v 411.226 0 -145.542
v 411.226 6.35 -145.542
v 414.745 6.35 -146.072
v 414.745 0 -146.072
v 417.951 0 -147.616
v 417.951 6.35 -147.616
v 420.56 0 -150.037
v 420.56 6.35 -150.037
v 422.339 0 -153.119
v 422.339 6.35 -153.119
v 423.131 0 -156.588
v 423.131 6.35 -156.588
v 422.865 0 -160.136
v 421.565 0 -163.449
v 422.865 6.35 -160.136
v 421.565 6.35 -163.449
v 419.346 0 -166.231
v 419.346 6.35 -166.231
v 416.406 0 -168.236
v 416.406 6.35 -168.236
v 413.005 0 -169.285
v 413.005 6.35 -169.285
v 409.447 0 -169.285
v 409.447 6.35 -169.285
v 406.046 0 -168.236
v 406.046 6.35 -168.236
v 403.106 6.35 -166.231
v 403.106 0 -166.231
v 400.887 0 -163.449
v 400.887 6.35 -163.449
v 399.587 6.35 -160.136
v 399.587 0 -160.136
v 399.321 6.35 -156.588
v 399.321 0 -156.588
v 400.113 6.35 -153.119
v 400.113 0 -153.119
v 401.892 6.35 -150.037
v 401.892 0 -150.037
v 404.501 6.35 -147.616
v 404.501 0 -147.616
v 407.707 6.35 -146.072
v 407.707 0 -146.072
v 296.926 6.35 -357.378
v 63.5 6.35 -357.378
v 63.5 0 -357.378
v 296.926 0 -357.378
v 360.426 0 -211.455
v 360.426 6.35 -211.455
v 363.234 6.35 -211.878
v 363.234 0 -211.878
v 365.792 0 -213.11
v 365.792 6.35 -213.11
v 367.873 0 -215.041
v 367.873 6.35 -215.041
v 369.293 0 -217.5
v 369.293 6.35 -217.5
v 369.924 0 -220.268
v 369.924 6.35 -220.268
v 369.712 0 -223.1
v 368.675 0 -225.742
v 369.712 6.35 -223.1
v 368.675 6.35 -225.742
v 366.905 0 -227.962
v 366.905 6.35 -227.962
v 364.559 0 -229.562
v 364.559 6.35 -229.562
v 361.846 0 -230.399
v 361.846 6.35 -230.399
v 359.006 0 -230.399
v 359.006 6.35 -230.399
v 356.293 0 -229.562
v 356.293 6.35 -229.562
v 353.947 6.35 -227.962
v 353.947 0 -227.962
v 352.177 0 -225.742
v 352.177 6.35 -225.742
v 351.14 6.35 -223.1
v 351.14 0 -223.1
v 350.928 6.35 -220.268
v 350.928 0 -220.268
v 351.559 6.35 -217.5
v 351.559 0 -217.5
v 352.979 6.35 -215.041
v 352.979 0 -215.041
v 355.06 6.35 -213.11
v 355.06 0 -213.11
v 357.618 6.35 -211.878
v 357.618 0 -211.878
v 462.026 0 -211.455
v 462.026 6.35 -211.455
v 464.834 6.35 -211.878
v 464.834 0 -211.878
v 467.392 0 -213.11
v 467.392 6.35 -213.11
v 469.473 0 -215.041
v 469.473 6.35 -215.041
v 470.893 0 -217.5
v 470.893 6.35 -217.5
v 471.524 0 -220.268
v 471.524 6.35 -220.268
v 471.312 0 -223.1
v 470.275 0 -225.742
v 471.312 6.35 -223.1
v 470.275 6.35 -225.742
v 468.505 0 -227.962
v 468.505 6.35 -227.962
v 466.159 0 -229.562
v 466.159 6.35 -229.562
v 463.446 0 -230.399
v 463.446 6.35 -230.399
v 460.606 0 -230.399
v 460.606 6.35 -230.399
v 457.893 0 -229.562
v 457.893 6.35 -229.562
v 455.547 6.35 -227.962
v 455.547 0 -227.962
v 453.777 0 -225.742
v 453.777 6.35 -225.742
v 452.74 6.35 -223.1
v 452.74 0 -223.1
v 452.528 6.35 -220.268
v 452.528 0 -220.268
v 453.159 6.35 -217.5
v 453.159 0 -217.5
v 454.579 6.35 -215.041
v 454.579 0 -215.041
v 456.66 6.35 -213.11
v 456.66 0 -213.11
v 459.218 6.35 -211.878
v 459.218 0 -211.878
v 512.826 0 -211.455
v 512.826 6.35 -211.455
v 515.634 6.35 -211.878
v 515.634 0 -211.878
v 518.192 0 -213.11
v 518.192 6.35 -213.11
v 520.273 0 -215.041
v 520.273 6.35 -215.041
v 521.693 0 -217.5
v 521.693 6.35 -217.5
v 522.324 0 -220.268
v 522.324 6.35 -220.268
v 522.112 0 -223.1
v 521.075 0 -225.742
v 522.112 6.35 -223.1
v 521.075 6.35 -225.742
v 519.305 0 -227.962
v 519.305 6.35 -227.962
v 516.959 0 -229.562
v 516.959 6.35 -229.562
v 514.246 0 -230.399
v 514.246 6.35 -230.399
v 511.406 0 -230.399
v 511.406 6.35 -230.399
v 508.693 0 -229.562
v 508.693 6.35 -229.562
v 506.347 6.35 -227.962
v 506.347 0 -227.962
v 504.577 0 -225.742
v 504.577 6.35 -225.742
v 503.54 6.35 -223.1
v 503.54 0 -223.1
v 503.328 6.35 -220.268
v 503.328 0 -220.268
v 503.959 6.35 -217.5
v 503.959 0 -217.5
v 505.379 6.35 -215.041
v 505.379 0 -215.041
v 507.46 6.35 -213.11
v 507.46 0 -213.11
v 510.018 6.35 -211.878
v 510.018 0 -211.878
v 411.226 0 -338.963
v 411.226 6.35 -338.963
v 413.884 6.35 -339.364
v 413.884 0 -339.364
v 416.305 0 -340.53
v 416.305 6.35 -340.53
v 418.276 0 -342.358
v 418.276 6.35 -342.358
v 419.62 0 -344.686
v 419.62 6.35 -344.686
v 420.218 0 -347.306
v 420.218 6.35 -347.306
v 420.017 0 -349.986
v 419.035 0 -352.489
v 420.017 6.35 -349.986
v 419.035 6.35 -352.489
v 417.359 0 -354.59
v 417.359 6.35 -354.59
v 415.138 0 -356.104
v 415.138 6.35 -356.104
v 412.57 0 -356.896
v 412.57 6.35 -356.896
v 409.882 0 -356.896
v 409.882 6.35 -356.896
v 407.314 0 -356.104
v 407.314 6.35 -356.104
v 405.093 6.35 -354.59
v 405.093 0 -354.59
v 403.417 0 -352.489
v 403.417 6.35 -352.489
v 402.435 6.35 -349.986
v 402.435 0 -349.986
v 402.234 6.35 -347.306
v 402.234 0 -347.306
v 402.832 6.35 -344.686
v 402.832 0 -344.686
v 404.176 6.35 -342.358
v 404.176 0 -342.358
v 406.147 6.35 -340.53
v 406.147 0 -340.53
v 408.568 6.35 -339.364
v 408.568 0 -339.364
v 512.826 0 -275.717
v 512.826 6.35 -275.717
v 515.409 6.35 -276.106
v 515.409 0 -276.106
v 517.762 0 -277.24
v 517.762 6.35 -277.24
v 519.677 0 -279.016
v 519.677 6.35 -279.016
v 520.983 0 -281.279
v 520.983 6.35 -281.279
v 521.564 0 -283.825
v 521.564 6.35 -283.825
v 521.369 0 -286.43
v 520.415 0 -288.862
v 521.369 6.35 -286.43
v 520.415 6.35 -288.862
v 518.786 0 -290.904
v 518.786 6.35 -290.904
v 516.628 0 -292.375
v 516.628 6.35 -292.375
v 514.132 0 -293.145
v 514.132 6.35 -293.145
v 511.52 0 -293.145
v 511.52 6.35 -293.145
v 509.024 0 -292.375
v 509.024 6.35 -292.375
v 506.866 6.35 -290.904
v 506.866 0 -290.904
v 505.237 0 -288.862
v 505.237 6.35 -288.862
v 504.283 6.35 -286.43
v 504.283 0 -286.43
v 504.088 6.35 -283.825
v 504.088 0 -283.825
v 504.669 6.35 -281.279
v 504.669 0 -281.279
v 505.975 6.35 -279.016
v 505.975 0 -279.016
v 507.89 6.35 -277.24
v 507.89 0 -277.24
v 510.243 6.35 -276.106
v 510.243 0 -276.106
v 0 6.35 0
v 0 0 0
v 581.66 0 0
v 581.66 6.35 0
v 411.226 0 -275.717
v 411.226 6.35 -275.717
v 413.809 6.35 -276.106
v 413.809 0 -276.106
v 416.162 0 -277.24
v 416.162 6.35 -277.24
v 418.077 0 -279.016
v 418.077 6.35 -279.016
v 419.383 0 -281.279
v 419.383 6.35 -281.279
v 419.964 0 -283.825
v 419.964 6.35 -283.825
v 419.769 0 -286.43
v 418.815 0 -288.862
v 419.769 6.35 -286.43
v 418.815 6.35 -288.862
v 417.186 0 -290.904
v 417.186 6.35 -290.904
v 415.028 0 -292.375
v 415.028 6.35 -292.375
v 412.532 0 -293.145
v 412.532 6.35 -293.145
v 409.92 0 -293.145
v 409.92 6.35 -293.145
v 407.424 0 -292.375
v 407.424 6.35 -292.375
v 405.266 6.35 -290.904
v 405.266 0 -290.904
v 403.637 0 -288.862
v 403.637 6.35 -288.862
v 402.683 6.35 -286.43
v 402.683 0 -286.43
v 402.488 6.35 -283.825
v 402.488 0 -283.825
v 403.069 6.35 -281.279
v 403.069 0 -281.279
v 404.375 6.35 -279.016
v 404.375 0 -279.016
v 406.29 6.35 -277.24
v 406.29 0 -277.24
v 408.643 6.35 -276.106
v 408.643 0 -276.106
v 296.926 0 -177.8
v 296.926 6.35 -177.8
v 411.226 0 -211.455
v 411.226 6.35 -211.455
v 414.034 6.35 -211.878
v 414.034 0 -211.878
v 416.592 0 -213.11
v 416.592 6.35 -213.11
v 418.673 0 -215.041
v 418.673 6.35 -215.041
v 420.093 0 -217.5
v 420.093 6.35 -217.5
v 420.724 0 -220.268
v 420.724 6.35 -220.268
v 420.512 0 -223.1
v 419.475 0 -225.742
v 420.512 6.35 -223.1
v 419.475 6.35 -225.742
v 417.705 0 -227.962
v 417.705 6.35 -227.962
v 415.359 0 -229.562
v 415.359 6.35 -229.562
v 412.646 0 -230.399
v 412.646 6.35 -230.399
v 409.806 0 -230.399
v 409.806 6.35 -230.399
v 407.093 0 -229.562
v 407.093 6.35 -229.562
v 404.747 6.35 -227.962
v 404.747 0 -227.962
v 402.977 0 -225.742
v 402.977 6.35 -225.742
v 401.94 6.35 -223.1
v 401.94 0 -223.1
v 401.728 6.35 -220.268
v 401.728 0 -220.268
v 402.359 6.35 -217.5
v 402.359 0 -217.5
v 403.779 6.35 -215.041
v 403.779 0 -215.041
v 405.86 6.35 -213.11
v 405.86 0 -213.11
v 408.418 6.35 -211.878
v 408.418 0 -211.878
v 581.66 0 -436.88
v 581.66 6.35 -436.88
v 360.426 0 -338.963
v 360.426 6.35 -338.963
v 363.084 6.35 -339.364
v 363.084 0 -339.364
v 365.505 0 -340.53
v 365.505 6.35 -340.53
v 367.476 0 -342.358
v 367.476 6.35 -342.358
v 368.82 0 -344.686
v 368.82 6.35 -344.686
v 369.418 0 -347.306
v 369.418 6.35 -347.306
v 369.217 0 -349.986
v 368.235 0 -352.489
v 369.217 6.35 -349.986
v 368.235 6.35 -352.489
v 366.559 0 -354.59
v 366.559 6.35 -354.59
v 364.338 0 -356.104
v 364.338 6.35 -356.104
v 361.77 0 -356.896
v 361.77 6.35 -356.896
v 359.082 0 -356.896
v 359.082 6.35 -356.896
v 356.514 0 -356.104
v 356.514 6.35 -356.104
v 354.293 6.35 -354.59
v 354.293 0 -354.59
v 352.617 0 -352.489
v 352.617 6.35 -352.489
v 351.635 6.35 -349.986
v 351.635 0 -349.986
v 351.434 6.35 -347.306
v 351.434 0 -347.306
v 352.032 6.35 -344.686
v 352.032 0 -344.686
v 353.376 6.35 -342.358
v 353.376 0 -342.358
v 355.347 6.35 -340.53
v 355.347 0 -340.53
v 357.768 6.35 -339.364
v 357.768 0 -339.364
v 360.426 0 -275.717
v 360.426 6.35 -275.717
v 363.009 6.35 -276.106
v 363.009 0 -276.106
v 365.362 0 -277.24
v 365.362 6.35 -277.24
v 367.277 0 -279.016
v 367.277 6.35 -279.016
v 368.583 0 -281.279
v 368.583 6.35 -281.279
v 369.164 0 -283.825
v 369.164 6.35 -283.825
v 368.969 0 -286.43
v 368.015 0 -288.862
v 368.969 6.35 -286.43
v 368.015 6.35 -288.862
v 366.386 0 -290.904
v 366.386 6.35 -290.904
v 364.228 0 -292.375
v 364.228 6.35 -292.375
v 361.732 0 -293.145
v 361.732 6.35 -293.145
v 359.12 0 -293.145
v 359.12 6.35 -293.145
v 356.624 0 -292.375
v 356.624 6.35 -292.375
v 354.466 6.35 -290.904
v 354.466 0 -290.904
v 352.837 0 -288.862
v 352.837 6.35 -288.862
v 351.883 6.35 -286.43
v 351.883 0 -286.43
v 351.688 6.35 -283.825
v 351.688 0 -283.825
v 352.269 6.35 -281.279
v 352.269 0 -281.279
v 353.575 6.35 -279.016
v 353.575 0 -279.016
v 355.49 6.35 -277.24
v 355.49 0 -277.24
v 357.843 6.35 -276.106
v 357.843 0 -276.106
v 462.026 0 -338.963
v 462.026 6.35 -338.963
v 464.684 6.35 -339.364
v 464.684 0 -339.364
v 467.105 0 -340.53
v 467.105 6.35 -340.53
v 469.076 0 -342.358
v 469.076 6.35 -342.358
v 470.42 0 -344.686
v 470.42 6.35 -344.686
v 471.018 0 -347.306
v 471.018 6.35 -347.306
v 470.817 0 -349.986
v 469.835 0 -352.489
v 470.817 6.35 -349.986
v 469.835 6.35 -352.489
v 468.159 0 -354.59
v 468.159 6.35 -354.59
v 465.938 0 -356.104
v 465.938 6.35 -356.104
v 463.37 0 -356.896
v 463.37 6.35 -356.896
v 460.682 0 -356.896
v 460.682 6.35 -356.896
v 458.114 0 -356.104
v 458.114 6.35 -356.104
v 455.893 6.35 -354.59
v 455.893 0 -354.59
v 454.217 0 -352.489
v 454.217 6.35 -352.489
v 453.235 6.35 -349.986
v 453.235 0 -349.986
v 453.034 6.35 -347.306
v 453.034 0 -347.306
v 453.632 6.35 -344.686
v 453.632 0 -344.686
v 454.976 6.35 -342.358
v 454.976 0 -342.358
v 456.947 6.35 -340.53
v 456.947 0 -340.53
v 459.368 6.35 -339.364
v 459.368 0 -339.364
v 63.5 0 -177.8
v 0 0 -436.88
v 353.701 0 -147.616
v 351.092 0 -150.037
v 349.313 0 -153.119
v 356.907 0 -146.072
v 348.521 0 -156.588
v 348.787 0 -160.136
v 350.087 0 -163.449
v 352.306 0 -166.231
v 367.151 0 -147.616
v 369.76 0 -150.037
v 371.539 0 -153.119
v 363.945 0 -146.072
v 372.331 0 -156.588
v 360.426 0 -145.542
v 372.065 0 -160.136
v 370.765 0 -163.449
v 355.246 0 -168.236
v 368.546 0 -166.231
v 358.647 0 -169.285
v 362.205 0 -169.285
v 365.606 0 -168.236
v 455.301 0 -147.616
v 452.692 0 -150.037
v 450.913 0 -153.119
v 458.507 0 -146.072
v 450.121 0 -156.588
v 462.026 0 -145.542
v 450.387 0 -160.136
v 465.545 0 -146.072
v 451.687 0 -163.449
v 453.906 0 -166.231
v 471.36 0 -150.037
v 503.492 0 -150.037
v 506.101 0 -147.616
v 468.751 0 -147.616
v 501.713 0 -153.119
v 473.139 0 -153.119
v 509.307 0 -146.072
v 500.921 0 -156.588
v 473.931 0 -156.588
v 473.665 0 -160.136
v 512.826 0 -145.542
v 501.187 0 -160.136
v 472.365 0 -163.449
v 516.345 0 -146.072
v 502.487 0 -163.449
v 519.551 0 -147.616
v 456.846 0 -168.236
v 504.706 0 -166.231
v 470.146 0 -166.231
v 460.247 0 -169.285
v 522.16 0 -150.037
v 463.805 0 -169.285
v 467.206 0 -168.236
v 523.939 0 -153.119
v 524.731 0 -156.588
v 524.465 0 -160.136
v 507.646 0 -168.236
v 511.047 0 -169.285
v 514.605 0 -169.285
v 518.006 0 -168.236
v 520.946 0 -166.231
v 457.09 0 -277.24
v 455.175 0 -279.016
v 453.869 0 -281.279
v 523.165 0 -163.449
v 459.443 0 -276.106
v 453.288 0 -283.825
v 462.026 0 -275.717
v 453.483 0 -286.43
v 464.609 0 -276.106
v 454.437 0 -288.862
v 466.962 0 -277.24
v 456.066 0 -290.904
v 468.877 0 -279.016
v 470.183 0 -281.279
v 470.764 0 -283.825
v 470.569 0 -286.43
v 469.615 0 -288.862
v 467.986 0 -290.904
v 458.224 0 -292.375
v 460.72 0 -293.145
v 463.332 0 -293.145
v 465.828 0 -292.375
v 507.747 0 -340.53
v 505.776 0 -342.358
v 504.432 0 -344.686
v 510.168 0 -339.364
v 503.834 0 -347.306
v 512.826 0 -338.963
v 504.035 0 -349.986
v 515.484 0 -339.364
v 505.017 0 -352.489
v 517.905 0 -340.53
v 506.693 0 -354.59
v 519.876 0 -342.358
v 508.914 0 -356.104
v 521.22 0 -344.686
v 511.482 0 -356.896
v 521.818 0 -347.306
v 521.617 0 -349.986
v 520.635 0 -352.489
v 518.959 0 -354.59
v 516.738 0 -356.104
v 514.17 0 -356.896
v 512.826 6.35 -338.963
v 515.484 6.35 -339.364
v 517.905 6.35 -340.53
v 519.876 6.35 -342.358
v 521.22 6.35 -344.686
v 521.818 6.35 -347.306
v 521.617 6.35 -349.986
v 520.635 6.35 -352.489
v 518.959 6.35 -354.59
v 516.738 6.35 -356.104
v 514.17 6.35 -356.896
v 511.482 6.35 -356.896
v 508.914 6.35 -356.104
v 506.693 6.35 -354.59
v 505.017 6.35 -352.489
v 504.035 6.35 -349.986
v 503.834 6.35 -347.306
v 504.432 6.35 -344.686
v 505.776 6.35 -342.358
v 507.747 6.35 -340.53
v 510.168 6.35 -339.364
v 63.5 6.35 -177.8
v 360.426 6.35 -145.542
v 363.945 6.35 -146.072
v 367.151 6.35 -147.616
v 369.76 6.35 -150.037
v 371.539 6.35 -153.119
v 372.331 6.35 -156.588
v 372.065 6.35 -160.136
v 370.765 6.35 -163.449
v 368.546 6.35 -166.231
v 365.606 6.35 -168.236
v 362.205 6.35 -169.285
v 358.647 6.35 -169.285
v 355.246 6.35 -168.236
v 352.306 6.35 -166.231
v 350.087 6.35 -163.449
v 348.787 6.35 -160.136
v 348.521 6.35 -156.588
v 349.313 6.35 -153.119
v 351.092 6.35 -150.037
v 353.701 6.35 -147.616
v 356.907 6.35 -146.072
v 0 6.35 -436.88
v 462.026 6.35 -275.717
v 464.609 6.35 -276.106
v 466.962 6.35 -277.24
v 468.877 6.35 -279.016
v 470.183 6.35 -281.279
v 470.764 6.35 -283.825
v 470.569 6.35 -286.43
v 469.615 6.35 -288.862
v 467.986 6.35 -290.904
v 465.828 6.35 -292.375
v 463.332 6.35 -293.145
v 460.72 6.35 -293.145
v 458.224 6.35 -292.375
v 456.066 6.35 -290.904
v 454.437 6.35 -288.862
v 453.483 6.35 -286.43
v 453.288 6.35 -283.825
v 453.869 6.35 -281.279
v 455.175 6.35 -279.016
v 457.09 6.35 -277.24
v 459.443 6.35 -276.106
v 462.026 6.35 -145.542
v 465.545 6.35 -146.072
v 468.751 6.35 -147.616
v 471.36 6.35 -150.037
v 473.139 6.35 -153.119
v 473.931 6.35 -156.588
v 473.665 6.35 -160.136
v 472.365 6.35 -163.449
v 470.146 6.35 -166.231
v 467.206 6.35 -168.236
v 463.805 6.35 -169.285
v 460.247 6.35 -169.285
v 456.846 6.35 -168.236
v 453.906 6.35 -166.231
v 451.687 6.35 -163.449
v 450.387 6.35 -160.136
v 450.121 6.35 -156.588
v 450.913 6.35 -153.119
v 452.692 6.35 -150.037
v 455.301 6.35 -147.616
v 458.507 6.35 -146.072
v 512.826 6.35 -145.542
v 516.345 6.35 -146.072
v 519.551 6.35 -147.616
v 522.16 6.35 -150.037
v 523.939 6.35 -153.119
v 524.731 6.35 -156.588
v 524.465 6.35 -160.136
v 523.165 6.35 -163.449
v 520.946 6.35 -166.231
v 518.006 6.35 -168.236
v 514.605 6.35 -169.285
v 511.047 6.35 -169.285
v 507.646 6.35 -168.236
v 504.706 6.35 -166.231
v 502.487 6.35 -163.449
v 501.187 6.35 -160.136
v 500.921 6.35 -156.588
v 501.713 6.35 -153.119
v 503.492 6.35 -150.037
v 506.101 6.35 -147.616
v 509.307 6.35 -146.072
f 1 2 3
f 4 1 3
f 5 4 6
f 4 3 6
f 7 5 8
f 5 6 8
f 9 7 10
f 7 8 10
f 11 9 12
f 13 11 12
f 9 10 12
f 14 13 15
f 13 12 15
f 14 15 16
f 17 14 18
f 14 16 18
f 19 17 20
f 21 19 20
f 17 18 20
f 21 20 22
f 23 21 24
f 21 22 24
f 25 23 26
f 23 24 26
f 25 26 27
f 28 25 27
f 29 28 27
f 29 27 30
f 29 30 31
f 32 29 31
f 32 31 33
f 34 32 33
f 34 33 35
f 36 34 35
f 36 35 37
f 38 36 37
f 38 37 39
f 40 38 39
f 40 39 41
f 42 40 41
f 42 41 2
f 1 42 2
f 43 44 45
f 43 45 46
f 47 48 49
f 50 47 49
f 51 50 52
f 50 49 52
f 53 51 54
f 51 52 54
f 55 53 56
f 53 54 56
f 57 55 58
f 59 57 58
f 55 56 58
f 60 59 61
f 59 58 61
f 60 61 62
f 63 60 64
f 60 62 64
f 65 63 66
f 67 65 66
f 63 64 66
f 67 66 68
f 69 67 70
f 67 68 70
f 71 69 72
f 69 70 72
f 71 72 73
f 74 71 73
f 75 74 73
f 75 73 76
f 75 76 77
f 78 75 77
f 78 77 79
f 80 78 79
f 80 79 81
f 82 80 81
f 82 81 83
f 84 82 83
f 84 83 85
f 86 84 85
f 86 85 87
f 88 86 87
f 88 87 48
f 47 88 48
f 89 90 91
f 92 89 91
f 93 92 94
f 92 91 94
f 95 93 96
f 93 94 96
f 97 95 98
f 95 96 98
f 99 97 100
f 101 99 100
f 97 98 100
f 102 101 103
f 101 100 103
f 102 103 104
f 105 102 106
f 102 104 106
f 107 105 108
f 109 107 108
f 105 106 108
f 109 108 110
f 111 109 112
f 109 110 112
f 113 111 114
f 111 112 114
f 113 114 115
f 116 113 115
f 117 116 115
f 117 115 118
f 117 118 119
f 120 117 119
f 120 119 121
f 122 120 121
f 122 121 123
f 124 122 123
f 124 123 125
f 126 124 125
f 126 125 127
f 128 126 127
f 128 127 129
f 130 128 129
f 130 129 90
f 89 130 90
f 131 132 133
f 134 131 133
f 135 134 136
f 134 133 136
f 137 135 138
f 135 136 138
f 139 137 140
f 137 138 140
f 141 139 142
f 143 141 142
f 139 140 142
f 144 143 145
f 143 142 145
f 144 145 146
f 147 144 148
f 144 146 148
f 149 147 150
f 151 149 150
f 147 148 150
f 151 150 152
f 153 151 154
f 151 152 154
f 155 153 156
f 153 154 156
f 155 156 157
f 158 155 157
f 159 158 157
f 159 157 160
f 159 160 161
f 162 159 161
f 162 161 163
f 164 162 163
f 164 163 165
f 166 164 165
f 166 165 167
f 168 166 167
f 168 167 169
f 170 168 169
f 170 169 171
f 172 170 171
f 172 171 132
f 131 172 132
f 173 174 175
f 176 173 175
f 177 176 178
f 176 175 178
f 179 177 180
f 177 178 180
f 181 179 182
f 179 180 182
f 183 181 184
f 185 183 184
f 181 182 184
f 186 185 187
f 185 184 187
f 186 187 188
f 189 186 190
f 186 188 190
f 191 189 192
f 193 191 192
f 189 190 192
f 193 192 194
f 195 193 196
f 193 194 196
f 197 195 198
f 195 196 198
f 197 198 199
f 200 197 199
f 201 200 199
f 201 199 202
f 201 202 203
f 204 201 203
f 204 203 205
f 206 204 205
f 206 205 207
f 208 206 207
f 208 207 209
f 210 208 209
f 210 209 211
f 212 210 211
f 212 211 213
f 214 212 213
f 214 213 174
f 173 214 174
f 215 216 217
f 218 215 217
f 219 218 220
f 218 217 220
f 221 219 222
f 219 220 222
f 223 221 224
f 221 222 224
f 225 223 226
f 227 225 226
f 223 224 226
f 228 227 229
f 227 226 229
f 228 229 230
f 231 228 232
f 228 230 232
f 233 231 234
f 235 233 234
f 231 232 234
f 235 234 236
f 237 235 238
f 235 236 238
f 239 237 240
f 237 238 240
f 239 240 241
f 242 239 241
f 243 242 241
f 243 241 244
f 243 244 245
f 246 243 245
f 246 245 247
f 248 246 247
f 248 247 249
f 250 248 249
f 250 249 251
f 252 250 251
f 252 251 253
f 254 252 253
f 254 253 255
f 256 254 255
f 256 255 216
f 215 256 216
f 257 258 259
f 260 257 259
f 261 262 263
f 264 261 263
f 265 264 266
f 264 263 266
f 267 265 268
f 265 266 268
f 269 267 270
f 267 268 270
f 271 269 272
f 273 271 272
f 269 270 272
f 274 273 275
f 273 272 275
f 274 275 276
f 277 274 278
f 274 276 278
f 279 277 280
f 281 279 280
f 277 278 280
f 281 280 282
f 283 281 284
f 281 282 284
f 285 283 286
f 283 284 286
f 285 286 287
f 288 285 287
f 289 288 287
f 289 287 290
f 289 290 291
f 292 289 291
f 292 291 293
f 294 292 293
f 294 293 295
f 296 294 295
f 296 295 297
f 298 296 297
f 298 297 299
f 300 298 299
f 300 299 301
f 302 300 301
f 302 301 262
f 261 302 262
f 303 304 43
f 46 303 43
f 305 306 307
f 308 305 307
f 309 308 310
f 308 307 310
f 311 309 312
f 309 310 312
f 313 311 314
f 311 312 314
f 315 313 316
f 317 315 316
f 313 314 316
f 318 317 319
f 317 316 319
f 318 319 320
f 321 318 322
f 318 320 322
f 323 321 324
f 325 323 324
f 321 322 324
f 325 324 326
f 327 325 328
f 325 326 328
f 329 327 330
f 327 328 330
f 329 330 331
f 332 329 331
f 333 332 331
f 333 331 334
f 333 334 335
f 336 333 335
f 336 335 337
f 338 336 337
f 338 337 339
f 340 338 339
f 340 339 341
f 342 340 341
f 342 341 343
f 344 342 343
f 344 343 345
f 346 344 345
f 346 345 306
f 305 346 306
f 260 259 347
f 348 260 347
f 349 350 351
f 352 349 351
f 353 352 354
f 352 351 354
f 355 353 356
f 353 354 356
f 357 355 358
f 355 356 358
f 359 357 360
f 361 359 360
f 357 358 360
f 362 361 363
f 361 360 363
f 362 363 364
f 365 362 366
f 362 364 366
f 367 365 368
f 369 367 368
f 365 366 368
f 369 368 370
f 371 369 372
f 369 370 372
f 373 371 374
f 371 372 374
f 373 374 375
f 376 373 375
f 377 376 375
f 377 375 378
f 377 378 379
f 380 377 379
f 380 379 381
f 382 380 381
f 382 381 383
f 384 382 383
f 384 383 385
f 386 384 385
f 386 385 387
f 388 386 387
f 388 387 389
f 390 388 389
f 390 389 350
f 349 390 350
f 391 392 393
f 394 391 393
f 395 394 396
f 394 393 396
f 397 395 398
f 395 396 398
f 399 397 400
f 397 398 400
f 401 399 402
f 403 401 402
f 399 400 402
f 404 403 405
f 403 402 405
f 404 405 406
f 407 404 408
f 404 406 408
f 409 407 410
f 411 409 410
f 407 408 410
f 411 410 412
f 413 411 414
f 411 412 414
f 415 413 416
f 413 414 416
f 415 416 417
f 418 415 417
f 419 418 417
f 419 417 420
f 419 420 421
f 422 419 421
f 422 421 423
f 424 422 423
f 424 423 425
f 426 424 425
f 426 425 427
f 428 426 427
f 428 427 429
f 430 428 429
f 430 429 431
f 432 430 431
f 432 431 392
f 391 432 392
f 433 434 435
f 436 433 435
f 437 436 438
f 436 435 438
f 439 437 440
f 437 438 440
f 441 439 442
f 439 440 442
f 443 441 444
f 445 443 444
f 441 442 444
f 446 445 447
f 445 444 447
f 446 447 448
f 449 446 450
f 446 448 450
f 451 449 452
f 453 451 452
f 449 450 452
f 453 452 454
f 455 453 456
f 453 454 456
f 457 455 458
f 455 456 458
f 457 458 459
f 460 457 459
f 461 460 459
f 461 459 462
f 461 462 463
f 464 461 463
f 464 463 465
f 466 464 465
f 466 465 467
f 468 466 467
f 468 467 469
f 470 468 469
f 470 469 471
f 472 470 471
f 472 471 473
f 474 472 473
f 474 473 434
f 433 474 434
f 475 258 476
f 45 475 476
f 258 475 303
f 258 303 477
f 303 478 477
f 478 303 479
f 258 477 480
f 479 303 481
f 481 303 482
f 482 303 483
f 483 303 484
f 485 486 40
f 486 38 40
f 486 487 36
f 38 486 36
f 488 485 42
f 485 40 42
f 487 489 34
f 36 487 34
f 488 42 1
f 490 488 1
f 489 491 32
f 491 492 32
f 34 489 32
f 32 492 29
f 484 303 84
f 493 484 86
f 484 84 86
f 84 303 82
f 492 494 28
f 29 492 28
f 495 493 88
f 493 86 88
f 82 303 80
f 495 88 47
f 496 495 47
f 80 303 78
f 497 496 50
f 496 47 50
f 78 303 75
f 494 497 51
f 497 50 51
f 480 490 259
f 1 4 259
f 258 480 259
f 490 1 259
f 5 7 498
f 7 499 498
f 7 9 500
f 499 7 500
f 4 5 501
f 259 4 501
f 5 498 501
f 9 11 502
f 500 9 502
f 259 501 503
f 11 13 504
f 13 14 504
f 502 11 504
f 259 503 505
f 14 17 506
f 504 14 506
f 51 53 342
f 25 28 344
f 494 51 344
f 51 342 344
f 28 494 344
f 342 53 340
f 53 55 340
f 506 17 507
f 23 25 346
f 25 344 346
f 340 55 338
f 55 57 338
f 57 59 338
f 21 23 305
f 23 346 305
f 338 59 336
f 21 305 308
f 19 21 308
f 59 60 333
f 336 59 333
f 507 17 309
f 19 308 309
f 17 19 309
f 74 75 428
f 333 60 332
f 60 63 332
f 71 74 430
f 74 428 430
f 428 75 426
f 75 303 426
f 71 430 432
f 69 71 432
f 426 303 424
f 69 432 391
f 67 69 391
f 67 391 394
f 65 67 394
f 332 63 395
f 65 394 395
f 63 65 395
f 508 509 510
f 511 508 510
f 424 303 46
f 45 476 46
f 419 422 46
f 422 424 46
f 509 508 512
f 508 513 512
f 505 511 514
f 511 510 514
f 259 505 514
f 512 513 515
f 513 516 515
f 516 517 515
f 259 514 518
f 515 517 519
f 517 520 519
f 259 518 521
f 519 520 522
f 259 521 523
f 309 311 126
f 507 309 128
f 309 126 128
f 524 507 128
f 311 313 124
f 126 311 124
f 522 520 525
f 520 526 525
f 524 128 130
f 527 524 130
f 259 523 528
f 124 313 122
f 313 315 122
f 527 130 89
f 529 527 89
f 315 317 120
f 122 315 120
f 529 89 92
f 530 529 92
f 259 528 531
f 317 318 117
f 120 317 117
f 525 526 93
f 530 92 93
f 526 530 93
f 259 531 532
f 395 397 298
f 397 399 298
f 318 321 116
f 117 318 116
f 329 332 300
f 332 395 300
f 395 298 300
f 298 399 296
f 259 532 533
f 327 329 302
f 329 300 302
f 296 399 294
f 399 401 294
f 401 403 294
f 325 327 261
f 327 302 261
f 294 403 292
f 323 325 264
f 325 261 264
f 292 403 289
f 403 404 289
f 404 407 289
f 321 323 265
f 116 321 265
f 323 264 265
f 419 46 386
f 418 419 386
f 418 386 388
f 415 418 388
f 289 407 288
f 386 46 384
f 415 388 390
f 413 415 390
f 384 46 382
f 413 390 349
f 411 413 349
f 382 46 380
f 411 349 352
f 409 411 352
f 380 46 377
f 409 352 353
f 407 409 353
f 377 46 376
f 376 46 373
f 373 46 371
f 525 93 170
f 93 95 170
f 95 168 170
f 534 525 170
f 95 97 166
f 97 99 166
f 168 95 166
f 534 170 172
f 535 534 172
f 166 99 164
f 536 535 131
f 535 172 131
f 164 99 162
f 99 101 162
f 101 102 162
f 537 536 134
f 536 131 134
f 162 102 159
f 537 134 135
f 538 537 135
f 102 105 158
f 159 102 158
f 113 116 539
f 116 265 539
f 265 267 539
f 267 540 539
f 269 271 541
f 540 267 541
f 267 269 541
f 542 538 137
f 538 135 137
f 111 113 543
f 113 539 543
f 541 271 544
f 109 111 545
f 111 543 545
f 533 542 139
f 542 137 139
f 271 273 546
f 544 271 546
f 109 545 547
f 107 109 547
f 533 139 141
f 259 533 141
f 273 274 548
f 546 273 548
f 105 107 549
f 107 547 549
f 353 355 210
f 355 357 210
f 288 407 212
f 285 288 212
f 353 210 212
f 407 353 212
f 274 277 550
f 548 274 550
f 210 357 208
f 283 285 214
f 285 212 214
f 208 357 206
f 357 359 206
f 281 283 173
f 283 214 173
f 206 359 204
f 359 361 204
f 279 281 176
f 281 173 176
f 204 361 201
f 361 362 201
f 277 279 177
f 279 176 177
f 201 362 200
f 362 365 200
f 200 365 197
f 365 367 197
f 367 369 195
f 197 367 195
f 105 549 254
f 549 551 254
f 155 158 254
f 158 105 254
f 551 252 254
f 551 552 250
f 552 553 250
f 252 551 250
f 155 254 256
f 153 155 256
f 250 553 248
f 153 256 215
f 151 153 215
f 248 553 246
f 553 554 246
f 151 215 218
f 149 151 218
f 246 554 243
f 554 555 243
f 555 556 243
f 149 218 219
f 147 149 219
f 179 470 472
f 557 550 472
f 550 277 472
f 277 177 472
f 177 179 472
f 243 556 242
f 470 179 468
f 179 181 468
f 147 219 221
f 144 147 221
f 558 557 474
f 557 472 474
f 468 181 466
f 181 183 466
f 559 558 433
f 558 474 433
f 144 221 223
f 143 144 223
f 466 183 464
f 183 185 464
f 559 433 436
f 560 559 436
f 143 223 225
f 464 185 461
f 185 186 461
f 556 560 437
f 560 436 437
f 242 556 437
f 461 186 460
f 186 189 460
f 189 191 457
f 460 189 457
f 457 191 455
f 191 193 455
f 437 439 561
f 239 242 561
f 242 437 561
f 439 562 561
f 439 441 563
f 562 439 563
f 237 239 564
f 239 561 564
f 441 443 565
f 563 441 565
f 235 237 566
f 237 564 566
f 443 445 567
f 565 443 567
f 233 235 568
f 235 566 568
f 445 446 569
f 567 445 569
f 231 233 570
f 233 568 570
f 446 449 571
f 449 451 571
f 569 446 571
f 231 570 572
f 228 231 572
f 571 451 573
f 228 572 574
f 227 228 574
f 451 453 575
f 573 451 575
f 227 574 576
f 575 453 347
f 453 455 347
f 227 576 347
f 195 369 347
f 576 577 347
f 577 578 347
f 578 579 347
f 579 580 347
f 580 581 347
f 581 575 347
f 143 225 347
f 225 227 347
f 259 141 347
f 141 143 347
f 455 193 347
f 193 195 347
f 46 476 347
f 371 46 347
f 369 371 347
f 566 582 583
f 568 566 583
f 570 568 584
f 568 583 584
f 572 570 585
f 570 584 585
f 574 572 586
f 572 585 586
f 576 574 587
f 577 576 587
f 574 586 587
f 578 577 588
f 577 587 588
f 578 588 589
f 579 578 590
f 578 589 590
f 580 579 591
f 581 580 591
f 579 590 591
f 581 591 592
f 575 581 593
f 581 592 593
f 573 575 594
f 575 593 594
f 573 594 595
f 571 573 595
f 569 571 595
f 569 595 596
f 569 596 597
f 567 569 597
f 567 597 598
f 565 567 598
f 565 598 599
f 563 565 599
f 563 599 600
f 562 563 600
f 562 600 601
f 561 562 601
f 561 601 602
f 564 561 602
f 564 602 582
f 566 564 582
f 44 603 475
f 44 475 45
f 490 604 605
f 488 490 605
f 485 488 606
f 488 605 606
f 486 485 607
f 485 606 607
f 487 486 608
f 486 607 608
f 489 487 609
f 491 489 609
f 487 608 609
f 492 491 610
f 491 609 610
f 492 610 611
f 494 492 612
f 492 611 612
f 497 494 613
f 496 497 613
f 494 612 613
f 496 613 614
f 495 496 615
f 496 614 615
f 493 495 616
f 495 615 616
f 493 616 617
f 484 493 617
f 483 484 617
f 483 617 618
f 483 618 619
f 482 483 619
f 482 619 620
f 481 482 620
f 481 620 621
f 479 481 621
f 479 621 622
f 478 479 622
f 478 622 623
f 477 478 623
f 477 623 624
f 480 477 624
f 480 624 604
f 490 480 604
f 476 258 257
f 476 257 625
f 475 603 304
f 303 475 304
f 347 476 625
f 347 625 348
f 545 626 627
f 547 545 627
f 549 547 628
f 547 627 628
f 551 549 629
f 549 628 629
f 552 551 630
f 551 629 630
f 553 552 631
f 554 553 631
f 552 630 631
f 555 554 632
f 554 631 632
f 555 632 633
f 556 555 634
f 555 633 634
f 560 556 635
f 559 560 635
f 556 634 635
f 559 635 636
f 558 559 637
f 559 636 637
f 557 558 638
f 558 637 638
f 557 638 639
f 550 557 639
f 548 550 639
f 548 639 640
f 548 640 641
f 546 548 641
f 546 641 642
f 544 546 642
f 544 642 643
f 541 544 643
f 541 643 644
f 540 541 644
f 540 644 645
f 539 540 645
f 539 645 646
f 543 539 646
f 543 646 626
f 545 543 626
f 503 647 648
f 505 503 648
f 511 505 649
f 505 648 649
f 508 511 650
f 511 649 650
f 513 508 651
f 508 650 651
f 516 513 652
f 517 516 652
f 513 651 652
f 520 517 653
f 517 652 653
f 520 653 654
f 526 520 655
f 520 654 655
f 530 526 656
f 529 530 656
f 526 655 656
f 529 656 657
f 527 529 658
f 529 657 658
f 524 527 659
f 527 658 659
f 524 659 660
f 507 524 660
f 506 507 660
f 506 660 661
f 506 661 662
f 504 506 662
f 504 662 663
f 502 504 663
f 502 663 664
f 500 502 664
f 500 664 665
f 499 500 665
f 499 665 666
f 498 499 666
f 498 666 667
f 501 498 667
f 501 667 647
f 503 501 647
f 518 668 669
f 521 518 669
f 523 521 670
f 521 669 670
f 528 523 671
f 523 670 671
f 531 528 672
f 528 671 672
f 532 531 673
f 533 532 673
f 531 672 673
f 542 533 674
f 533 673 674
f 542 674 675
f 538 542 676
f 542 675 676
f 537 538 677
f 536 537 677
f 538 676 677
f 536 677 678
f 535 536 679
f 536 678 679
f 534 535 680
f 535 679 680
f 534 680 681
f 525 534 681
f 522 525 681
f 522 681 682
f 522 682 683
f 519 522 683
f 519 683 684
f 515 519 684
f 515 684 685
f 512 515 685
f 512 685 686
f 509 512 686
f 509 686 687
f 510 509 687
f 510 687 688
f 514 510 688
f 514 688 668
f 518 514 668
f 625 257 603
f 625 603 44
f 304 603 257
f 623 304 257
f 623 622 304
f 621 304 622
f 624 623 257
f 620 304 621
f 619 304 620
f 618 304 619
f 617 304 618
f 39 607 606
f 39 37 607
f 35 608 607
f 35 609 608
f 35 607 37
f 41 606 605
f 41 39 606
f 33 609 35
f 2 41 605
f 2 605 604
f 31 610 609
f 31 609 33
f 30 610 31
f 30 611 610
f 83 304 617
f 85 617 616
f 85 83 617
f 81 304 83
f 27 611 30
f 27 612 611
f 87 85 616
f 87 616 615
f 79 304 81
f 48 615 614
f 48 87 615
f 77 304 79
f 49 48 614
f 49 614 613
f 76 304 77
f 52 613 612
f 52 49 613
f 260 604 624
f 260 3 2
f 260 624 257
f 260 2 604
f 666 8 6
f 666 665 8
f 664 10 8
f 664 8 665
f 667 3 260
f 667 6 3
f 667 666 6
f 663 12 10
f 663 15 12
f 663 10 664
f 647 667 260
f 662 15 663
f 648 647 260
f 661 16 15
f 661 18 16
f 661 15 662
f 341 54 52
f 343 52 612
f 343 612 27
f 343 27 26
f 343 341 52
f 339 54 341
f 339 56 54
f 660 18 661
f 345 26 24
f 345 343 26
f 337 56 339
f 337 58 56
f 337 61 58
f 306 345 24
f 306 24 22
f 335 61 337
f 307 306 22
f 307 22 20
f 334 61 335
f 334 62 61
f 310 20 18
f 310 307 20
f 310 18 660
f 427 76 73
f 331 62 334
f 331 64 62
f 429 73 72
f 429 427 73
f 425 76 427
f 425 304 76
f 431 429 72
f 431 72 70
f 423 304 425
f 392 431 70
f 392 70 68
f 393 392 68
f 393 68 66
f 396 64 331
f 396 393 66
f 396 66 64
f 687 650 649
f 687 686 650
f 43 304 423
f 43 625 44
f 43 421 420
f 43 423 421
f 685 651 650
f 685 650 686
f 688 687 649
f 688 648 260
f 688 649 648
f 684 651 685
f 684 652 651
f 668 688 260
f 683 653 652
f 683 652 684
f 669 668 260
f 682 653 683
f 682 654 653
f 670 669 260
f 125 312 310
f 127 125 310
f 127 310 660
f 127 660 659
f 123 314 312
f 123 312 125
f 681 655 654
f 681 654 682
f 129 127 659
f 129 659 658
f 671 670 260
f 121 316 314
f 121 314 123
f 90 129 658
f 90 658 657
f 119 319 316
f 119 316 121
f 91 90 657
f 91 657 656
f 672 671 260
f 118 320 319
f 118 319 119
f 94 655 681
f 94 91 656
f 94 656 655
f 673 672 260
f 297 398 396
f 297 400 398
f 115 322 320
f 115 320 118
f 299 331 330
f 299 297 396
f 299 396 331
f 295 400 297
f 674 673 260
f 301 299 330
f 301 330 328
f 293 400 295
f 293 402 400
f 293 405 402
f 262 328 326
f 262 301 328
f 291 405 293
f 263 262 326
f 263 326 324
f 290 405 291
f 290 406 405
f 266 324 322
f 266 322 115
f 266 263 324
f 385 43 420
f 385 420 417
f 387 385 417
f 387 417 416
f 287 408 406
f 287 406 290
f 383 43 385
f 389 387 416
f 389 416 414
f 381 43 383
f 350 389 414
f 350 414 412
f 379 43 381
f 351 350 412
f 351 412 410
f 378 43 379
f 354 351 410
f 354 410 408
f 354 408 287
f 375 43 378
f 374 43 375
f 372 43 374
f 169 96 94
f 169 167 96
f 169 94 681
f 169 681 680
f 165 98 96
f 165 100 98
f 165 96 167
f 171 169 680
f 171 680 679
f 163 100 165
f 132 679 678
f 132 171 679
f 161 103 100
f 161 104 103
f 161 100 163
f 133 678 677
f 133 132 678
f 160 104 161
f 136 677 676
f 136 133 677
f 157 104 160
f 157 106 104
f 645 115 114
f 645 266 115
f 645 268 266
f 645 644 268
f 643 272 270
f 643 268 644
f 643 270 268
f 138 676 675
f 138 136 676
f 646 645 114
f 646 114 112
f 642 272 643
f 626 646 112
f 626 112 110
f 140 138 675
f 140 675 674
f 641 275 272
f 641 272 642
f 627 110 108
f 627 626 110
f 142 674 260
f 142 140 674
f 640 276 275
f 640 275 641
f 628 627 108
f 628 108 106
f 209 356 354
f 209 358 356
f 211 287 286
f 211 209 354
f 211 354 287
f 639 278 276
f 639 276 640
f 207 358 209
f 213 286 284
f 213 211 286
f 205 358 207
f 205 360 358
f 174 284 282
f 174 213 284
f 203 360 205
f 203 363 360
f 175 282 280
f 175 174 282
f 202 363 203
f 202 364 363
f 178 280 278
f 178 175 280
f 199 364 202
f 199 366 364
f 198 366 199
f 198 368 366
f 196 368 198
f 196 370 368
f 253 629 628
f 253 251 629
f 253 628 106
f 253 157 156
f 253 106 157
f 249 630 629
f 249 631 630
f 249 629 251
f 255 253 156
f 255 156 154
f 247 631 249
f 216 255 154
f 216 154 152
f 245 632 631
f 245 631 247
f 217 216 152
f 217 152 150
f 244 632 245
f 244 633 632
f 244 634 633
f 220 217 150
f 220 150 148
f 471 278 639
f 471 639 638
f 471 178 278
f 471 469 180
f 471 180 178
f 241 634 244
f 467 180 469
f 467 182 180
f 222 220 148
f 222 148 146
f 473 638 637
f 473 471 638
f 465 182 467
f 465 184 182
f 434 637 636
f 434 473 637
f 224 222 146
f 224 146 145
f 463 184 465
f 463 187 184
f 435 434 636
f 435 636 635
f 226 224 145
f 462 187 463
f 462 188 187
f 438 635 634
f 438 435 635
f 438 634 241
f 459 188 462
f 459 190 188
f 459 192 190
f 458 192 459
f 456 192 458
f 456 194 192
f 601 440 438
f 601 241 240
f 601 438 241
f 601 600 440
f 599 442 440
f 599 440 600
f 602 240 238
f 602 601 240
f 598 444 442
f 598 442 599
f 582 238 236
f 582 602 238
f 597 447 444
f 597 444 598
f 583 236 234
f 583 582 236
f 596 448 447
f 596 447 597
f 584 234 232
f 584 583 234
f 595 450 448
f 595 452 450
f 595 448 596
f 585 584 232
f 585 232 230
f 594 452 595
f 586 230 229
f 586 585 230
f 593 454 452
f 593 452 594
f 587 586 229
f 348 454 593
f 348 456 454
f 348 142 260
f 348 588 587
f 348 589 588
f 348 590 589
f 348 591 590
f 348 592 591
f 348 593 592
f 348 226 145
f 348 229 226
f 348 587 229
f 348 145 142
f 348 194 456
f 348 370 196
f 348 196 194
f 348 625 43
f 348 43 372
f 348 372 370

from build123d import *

# Parameters (mm, degrees)
SKETCH1_W           = 581.66
SKETCH1_H           = 436.88
BOSS_EXTRUDE1_DEPTH = 6.35
SKETCH3_W           = 233.426
SKETCH3_H           = 179.578
CUT_EXTRUDE2_DEPTH  = 728.483891574
SKETCH4_R           = 9.017
CUT_EXTRUDE3_DEPTH  = 728.483891574
SKETCH5_R           = 8.763
CUT_EXTRUDE4_DEPTH  = 728.483891574
SKETCH6_R           = 9.525
CUT_EXTRUDE5_DEPTH  = 728.483891574
SKETCH7_R           = 11.938
CUT_EXTRUDE6_DEPTH  = 728.483891574


with BuildPart() as part:
    # Sketch1 → Boss-Extrude1 (new body)
    with BuildSketch(Plane(origin=(0, 0, 0), x_dir=(1, 0, 0), z_dir=(0, 1, 0))):
        with Locations((290.83, 218.44)):
            Rectangle(SKETCH1_W, SKETCH1_H)
    extrude(amount=BOSS_EXTRUDE1_DEPTH)

    # Sketch3 → Cut-Extrude2 (cut, through all)
    with BuildSketch(Plane(origin=(0, 6.35, 0), x_dir=(1, 0, 0), z_dir=(0, 1, 0))):
        with Locations((180.213, 267.589)):
            Rectangle(SKETCH3_W, SKETCH3_H)
    extrude(amount=-CUT_EXTRUDE2_DEPTH, mode=Mode.SUBTRACT)

    # Sketch4 → Cut-Extrude3 (cut, through all)
    with BuildSketch(Plane(origin=(0, 6.35, 0), x_dir=(1, 0, 0), z_dir=(0, 1, 0))):
        with Locations(Location((360.426, 347.98, 0), (0, 0, 270))):
            Circle(SKETCH4_R)
        with Locations(Location((411.226, 347.98, 0), (0, 0, 270))):
            Circle(SKETCH4_R)
        with Locations(Location((462.026, 347.98, 0), (0, 0, 270))):
            Circle(SKETCH4_R)
        with Locations(Location((512.826, 347.98, 0), (0, 0, 270))):
            Circle(SKETCH4_R)
    extrude(amount=-CUT_EXTRUDE3_DEPTH, mode=Mode.SUBTRACT)

    # Sketch5 → Cut-Extrude4 (cut, through all)
    with BuildSketch(Plane(origin=(0, 6.35, 0), x_dir=(1, 0, 0), z_dir=(0, 1, 0))):
        with Locations(Location((360.426, 284.48, 0), (0, 0, 270))):
            Circle(SKETCH5_R)
        with Locations(Location((411.226, 284.48, 0), (0, 0, 270))):
            Circle(SKETCH5_R)
        with Locations(Location((462.026, 284.48, 0), (0, 0, 270))):
            Circle(SKETCH5_R)
        with Locations(Location((512.826, 284.48, 0), (0, 0, 270))):
            Circle(SKETCH5_R)
    extrude(amount=-CUT_EXTRUDE4_DEPTH, mode=Mode.SUBTRACT)

    # Sketch6 → Cut-Extrude5 (cut, through all)
    with BuildSketch(Plane(origin=(0, 6.35, 0), x_dir=(1, 0, 0), z_dir=(0, 1, 0))):
        with Locations(Location((360.426, 220.98, 0), (0, 0, 270))):
            Circle(SKETCH6_R)
        with Locations(Location((411.226, 220.98, 0), (0, 0, 270))):
            Circle(SKETCH6_R)
        with Locations(Location((462.026, 220.98, 0), (0, 0, 270))):
            Circle(SKETCH6_R)
        with Locations(Location((512.826, 220.98, 0), (0, 0, 270))):
            Circle(SKETCH6_R)
    extrude(amount=-CUT_EXTRUDE5_DEPTH, mode=Mode.SUBTRACT)

    # Sketch7 → Cut-Extrude6 (cut, through all)
    with BuildSketch(Plane(origin=(0, 6.35, 0), x_dir=(1, 0, 0), z_dir=(0, 1, 0))):
        with Locations(Location((360.426, 157.48, 0), (0, 0, 270))):
            Circle(SKETCH7_R)
        with Locations(Location((411.226, 157.48, 0), (0, 0, 270))):
            Circle(SKETCH7_R)
        with Locations(Location((462.026, 157.48, 0), (0, 0, 270))):
            Circle(SKETCH7_R)
        with Locations(Location((512.826, 157.48, 0), (0, 0, 270))):
            Circle(SKETCH7_R)
    extrude(amount=-CUT_EXTRUDE6_DEPTH, mode=Mode.SUBTRACT)


solid = part.part
